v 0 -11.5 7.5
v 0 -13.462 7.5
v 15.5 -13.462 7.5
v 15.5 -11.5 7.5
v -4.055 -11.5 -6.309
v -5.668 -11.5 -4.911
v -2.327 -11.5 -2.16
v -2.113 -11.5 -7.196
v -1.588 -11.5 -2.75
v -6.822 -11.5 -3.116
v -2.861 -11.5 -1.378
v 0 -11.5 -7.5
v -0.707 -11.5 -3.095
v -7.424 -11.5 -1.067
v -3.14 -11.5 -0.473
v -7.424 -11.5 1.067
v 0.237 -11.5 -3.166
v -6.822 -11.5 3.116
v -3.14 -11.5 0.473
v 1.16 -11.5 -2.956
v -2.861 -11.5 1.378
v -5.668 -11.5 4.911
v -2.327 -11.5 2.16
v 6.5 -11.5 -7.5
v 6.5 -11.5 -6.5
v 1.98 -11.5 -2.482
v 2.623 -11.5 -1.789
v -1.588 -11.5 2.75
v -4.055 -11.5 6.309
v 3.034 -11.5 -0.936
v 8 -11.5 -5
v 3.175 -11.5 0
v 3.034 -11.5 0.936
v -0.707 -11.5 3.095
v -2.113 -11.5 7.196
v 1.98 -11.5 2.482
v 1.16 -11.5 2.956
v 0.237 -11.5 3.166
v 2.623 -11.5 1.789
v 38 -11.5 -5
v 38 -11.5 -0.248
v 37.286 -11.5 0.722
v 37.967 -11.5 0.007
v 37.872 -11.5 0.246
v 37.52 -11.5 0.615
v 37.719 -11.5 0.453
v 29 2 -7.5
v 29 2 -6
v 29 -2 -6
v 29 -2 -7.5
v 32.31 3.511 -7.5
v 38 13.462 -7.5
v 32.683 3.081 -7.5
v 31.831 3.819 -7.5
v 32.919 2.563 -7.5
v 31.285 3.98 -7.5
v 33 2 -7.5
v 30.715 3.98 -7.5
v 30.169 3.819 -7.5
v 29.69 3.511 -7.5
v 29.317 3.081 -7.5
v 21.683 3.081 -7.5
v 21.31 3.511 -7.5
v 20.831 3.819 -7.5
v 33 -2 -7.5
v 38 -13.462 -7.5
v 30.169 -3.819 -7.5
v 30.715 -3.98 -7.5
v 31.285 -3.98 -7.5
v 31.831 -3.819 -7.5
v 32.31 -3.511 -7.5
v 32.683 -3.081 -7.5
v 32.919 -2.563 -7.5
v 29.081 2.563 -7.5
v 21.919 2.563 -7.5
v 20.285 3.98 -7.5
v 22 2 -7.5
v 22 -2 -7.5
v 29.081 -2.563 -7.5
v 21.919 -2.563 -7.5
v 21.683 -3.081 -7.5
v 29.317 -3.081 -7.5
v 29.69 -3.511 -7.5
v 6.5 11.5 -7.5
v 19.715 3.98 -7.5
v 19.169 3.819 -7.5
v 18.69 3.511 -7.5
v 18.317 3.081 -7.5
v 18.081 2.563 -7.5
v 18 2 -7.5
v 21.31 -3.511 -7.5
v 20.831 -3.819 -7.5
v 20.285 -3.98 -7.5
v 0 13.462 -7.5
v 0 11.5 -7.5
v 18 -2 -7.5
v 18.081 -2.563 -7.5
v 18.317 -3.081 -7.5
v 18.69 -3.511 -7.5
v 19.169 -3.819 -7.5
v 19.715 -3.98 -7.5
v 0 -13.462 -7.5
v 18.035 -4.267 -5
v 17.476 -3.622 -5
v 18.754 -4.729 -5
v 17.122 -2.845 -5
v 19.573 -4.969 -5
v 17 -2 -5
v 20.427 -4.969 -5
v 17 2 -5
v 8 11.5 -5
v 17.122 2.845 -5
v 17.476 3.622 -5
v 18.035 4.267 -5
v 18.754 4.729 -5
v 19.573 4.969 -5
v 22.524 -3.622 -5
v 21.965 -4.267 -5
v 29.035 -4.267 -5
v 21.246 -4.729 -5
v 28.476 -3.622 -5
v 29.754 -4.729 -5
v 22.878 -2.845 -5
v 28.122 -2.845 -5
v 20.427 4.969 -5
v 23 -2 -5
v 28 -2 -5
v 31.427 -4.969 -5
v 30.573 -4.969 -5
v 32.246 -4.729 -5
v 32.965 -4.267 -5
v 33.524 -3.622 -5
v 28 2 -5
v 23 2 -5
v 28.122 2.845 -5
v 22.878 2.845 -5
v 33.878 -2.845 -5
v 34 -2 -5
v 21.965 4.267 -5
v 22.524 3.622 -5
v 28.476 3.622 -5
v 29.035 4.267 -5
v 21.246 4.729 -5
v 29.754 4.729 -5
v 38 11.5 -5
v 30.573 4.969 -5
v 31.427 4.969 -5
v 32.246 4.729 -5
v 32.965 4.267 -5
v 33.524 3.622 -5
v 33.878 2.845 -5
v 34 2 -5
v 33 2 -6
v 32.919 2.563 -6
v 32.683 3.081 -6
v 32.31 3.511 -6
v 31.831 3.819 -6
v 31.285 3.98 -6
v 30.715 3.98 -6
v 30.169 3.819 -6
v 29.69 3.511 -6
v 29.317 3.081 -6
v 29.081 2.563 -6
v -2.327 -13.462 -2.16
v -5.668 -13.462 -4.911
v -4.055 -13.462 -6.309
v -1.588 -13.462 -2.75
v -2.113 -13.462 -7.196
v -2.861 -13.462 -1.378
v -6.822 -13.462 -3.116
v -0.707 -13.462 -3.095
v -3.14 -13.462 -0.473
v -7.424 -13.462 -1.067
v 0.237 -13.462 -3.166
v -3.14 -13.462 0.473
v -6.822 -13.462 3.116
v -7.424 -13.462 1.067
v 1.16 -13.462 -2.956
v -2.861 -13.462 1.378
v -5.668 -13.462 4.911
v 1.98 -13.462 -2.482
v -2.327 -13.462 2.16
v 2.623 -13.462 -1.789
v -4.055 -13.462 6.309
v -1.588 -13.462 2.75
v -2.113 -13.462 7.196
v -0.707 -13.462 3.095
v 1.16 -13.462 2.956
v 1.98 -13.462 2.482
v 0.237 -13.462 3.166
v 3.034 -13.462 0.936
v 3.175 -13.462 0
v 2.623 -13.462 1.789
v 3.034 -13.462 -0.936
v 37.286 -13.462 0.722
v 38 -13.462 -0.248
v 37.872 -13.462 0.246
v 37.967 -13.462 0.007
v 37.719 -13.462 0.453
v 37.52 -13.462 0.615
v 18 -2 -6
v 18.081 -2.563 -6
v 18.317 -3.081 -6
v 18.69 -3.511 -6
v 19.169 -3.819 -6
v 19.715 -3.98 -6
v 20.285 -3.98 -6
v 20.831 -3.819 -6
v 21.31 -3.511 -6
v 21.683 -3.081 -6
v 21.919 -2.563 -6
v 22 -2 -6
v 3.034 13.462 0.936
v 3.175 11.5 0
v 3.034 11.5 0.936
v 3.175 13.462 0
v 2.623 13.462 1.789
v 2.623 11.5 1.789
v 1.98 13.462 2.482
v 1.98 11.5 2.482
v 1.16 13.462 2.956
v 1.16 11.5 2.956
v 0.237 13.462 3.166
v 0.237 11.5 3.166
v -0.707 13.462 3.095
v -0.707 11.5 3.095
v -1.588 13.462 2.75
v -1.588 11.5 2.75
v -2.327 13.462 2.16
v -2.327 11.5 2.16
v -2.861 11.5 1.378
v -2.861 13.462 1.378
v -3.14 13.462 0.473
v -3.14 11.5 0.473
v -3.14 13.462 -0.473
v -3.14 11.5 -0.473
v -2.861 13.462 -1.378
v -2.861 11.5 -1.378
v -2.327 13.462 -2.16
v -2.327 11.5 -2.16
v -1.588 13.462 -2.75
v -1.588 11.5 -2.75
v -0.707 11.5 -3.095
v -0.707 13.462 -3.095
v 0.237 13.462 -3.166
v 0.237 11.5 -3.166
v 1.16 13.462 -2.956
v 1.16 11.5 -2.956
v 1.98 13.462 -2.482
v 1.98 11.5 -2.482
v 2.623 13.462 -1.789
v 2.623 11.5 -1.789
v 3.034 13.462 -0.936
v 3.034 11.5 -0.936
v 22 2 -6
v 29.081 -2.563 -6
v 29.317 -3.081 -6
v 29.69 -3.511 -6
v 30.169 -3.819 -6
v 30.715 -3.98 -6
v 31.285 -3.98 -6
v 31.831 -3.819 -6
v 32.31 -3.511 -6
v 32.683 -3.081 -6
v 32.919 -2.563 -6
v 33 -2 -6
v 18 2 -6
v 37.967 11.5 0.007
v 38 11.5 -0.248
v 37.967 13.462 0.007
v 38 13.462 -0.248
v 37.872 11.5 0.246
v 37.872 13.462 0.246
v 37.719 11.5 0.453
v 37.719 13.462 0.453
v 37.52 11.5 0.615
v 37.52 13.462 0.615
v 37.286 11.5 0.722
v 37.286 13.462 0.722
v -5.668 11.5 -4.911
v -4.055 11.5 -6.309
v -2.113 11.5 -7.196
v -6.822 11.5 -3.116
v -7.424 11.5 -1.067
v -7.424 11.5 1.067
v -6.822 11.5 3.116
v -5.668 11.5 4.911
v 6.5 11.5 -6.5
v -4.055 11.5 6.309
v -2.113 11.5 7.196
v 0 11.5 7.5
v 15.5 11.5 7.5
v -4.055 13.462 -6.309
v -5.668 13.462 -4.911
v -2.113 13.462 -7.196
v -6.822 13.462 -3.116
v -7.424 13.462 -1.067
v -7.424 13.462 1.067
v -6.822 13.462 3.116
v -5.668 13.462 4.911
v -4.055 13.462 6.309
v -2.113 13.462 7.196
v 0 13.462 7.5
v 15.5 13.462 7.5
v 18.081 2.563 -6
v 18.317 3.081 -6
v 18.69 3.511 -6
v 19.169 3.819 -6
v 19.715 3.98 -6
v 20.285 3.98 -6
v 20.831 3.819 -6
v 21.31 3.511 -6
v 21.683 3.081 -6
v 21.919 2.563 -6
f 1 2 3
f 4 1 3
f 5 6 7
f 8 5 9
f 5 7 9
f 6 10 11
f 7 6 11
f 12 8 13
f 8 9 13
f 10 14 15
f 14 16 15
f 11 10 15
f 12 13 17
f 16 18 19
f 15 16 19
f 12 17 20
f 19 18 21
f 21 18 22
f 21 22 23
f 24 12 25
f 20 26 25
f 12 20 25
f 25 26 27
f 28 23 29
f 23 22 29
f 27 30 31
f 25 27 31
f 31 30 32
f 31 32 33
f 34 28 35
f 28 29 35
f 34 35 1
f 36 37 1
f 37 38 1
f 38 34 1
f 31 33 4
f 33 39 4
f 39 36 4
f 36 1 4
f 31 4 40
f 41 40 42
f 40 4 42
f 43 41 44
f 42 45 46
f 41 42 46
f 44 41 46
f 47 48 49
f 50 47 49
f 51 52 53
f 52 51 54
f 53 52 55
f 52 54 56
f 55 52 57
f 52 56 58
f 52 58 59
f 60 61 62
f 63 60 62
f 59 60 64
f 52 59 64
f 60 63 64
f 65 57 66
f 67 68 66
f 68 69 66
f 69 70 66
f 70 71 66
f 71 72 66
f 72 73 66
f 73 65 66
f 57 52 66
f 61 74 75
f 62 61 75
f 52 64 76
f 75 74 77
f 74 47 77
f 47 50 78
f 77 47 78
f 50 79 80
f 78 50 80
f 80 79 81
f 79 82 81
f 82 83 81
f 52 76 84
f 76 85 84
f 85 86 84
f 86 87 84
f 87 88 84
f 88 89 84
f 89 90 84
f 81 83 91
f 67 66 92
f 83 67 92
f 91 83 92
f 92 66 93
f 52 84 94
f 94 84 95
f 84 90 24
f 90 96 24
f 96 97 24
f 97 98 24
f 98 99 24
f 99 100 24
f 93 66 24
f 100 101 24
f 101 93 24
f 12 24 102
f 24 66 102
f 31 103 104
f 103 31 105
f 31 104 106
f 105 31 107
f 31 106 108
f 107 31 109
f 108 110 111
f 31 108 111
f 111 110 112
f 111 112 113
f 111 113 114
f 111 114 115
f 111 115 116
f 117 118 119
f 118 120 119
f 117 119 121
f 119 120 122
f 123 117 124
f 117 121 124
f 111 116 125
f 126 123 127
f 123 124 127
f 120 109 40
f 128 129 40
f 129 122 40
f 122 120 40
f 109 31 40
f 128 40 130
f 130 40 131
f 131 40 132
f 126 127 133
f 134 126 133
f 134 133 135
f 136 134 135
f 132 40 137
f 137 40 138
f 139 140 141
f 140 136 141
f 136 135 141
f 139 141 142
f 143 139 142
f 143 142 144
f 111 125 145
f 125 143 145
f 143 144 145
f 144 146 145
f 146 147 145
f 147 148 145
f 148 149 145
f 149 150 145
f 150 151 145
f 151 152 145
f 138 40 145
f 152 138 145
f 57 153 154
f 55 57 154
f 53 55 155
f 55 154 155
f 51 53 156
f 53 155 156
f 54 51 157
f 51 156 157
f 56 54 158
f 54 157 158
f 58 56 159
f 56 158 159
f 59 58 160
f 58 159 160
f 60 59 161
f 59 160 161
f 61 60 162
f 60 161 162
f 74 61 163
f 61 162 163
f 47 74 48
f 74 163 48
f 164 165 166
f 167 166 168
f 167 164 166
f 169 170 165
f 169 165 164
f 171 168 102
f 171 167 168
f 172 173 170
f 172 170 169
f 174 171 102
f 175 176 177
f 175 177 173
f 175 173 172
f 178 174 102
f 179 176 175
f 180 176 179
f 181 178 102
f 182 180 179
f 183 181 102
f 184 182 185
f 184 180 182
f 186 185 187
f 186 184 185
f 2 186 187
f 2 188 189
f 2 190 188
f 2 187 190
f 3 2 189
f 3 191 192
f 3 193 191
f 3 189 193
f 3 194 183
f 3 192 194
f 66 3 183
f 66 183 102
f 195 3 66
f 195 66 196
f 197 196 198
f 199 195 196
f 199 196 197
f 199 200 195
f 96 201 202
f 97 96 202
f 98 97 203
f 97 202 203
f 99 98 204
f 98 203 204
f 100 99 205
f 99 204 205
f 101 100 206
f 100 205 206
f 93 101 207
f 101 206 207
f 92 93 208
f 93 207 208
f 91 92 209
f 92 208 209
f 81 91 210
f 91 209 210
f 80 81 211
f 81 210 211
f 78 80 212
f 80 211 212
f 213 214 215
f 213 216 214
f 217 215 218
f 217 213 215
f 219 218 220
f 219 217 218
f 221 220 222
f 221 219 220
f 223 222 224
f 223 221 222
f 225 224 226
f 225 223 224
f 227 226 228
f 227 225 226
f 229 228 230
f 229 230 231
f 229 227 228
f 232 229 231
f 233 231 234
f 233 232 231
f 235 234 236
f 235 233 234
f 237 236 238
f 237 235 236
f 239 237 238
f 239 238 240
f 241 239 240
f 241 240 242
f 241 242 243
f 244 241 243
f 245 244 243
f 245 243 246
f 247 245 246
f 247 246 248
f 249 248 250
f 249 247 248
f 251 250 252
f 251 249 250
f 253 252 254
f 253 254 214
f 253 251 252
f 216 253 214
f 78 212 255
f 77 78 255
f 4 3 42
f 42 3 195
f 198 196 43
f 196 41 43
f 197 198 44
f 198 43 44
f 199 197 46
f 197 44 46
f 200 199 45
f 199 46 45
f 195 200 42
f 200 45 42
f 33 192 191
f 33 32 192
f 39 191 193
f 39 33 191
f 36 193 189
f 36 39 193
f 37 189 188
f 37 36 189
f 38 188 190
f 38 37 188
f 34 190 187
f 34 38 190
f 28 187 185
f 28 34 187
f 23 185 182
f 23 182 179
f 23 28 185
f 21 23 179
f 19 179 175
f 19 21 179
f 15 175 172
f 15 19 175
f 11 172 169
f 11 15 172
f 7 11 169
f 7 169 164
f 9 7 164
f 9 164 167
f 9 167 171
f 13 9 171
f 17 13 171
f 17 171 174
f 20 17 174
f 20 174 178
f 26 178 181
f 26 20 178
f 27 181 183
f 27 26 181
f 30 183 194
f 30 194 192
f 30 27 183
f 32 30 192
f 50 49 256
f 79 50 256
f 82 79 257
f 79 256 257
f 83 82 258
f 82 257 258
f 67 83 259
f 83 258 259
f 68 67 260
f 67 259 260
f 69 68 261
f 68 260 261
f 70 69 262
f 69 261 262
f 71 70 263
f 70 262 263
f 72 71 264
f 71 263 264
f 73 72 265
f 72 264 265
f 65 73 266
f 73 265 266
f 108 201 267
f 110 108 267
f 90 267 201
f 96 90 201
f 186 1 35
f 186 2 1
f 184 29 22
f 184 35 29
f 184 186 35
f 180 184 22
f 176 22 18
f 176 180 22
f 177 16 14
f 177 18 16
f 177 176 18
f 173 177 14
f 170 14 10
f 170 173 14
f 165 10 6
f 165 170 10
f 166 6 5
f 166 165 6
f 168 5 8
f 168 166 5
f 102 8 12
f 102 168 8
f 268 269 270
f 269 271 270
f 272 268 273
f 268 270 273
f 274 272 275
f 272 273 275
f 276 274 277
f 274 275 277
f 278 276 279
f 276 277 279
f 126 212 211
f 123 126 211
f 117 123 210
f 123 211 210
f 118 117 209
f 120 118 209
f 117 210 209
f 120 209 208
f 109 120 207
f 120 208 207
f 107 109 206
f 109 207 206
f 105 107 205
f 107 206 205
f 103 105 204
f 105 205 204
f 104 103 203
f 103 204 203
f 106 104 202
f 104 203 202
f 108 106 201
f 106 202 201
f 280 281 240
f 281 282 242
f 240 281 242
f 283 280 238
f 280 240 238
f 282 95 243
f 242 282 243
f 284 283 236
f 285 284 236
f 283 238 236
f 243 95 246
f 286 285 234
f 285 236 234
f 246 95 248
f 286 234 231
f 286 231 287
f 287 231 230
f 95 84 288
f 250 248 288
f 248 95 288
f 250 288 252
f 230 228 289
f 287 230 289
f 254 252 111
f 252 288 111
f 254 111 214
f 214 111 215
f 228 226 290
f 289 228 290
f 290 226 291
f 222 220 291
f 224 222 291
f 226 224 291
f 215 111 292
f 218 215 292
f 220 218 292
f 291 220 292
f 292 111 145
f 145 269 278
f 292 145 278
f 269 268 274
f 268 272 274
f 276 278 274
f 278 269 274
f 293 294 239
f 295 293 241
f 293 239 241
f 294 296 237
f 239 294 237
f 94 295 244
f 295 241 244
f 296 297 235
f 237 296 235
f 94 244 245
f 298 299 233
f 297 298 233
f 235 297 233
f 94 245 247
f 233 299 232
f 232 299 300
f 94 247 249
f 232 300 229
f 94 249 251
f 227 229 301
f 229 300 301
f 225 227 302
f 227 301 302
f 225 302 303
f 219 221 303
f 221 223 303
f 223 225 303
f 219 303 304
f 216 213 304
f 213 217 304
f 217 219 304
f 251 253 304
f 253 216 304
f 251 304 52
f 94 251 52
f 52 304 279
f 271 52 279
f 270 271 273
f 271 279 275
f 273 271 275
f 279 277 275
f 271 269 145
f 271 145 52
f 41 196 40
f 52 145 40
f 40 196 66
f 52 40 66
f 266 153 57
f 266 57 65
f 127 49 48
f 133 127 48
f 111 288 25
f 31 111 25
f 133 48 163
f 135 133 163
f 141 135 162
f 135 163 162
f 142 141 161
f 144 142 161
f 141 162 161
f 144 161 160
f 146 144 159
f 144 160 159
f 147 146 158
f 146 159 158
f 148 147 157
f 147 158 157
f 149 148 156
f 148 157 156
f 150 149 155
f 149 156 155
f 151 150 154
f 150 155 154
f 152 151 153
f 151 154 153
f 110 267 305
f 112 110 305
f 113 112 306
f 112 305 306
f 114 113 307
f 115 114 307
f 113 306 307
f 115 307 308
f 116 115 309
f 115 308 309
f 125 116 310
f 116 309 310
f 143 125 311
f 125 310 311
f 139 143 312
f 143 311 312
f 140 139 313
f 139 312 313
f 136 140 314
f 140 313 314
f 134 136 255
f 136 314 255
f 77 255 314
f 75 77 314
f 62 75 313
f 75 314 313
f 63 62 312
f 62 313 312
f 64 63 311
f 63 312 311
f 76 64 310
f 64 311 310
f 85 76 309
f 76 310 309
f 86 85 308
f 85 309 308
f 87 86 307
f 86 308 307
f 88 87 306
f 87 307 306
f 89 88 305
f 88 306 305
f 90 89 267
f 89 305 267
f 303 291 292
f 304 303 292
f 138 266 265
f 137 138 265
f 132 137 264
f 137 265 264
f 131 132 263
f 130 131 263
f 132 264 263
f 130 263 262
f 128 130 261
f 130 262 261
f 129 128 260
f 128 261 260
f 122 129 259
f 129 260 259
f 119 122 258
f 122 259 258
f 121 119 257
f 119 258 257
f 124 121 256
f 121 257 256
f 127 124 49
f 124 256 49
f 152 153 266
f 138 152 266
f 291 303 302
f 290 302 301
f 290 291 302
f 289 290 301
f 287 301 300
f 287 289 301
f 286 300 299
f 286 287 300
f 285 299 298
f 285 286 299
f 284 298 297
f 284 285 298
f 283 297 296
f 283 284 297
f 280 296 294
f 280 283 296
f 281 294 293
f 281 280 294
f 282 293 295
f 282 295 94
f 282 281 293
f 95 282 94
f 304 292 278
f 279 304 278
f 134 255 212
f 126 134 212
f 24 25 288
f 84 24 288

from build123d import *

# Parameters (mm, degrees)
SKETCH_R             = 3.175
PAD_DEPTH            = 13.462
SKETCH002_W          = 23
SKETCH002_H          = 13
POCKET_DEPTH         = 7.501
POCKET_DEPTH_BACK    = -38.001
SKETCH001_W          = 14
SKETCH001_H          = 23
POCKET001_DEPTH      = 7.501
POCKET001_DEPTH_BACK = -7.501
CHAMFER_SIZE         = 1.5
FILLET_R             = 1.016
FILLET001_R          = 1.016
CHAMFER001_SIZE      = 1
CHAMFER002_SIZE      = 1


with BuildPart() as part:
    # Sketch → Pad (new body, symmetric)
    with BuildSketch(Plane.XZ):
        with BuildLine():
            ThreePointArc((0, 7.5), (-7.5, 0), (0, -7.5))
            Line((38, -7.5), (0, -7.5))
            Line((38, 0.5), (38, -7.5))
            Line((15.5, 7.5), (38, 0.5))
            Line((0, 7.5), (15.5, 7.5))
        make_face()
        Circle(SKETCH_R, mode=Mode.SUBTRACT)
    extrude(amount=PAD_DEPTH, both=True)

    # Sketch002 → Pocket (cut, two sides)
    with BuildSketch(Plane.YZ) as pocket_sk:
        with Locations((0, 1.5)):
            Rectangle(SKETCH002_W, SKETCH002_H)
    extrude(amount=-POCKET_DEPTH, mode=Mode.SUBTRACT)
    extrude(pocket_sk.sketch, amount=-POCKET_DEPTH_BACK, mode=Mode.SUBTRACT)

    # Sketch001 → Pocket001 (cut, two sides)
    with BuildSketch(Plane.XY) as pocket001_sk:
        with Locations((-0.5, 0)):
            Rectangle(SKETCH001_W, SKETCH001_H)
        with BuildLine():
            Line((18, 2), (18, -2))
            ThreePointArc((18, -2), (20, -4), (22, -2))
            Line((22, -2), (22, 2))
            ThreePointArc((22, 2), (20, 4), (18, 2))
        make_face()
        with BuildLine():
            Line((29, 2), (29, -2))
            ThreePointArc((29, -2), (31, -4), (33, -2))
            Line((33, 2), (33, -2))
            ThreePointArc((33, 2), (31, 4), (29, 2))
        make_face()
    extrude(amount=-POCKET001_DEPTH, mode=Mode.SUBTRACT)
    extrude(pocket001_sk.sketch, amount=-POCKET001_DEPTH_BACK, mode=Mode.SUBTRACT)

    # Chamfer
    chamfer_edges = [part.edges().sort_by_distance(p)[0] for p in [
        (6.5, 0, -5),
    ]]
    chamfer(chamfer_edges, length=CHAMFER_SIZE)

    # Fillet
    fillet_edges = [part.edges().sort_by_distance(p)[0] for p in [
        (38, 12.481, 0.5),
    ]]
    fillet(fillet_edges, radius=FILLET_R)

    # Fillet001
    fillet001_edges = [part.edges().sort_by_distance(p)[0] for p in [
        (38, -12.481, 0.5),
    ]]
    fillet(fillet001_edges, radius=FILLET001_R)

    # Chamfer001
    chamfer001_edges = [part.edges().sort_by_distance(p)[0] for p in [
        (29, 0, -5),
        (31, 4, -5),
        (33, 0, -5),
        (31, -4, -5),
    ]]
    chamfer(chamfer001_edges, length=CHAMFER001_SIZE)

    # Chamfer002
    chamfer002_edges = [part.edges().sort_by_distance(p)[0] for p in [
        (22, 0, -5),
        (20, 4, -5),
        (18, 0, -5),
        (20, -4, -5),
    ]]
    chamfer(chamfer002_edges, length=CHAMFER002_SIZE)


solid = part.part
